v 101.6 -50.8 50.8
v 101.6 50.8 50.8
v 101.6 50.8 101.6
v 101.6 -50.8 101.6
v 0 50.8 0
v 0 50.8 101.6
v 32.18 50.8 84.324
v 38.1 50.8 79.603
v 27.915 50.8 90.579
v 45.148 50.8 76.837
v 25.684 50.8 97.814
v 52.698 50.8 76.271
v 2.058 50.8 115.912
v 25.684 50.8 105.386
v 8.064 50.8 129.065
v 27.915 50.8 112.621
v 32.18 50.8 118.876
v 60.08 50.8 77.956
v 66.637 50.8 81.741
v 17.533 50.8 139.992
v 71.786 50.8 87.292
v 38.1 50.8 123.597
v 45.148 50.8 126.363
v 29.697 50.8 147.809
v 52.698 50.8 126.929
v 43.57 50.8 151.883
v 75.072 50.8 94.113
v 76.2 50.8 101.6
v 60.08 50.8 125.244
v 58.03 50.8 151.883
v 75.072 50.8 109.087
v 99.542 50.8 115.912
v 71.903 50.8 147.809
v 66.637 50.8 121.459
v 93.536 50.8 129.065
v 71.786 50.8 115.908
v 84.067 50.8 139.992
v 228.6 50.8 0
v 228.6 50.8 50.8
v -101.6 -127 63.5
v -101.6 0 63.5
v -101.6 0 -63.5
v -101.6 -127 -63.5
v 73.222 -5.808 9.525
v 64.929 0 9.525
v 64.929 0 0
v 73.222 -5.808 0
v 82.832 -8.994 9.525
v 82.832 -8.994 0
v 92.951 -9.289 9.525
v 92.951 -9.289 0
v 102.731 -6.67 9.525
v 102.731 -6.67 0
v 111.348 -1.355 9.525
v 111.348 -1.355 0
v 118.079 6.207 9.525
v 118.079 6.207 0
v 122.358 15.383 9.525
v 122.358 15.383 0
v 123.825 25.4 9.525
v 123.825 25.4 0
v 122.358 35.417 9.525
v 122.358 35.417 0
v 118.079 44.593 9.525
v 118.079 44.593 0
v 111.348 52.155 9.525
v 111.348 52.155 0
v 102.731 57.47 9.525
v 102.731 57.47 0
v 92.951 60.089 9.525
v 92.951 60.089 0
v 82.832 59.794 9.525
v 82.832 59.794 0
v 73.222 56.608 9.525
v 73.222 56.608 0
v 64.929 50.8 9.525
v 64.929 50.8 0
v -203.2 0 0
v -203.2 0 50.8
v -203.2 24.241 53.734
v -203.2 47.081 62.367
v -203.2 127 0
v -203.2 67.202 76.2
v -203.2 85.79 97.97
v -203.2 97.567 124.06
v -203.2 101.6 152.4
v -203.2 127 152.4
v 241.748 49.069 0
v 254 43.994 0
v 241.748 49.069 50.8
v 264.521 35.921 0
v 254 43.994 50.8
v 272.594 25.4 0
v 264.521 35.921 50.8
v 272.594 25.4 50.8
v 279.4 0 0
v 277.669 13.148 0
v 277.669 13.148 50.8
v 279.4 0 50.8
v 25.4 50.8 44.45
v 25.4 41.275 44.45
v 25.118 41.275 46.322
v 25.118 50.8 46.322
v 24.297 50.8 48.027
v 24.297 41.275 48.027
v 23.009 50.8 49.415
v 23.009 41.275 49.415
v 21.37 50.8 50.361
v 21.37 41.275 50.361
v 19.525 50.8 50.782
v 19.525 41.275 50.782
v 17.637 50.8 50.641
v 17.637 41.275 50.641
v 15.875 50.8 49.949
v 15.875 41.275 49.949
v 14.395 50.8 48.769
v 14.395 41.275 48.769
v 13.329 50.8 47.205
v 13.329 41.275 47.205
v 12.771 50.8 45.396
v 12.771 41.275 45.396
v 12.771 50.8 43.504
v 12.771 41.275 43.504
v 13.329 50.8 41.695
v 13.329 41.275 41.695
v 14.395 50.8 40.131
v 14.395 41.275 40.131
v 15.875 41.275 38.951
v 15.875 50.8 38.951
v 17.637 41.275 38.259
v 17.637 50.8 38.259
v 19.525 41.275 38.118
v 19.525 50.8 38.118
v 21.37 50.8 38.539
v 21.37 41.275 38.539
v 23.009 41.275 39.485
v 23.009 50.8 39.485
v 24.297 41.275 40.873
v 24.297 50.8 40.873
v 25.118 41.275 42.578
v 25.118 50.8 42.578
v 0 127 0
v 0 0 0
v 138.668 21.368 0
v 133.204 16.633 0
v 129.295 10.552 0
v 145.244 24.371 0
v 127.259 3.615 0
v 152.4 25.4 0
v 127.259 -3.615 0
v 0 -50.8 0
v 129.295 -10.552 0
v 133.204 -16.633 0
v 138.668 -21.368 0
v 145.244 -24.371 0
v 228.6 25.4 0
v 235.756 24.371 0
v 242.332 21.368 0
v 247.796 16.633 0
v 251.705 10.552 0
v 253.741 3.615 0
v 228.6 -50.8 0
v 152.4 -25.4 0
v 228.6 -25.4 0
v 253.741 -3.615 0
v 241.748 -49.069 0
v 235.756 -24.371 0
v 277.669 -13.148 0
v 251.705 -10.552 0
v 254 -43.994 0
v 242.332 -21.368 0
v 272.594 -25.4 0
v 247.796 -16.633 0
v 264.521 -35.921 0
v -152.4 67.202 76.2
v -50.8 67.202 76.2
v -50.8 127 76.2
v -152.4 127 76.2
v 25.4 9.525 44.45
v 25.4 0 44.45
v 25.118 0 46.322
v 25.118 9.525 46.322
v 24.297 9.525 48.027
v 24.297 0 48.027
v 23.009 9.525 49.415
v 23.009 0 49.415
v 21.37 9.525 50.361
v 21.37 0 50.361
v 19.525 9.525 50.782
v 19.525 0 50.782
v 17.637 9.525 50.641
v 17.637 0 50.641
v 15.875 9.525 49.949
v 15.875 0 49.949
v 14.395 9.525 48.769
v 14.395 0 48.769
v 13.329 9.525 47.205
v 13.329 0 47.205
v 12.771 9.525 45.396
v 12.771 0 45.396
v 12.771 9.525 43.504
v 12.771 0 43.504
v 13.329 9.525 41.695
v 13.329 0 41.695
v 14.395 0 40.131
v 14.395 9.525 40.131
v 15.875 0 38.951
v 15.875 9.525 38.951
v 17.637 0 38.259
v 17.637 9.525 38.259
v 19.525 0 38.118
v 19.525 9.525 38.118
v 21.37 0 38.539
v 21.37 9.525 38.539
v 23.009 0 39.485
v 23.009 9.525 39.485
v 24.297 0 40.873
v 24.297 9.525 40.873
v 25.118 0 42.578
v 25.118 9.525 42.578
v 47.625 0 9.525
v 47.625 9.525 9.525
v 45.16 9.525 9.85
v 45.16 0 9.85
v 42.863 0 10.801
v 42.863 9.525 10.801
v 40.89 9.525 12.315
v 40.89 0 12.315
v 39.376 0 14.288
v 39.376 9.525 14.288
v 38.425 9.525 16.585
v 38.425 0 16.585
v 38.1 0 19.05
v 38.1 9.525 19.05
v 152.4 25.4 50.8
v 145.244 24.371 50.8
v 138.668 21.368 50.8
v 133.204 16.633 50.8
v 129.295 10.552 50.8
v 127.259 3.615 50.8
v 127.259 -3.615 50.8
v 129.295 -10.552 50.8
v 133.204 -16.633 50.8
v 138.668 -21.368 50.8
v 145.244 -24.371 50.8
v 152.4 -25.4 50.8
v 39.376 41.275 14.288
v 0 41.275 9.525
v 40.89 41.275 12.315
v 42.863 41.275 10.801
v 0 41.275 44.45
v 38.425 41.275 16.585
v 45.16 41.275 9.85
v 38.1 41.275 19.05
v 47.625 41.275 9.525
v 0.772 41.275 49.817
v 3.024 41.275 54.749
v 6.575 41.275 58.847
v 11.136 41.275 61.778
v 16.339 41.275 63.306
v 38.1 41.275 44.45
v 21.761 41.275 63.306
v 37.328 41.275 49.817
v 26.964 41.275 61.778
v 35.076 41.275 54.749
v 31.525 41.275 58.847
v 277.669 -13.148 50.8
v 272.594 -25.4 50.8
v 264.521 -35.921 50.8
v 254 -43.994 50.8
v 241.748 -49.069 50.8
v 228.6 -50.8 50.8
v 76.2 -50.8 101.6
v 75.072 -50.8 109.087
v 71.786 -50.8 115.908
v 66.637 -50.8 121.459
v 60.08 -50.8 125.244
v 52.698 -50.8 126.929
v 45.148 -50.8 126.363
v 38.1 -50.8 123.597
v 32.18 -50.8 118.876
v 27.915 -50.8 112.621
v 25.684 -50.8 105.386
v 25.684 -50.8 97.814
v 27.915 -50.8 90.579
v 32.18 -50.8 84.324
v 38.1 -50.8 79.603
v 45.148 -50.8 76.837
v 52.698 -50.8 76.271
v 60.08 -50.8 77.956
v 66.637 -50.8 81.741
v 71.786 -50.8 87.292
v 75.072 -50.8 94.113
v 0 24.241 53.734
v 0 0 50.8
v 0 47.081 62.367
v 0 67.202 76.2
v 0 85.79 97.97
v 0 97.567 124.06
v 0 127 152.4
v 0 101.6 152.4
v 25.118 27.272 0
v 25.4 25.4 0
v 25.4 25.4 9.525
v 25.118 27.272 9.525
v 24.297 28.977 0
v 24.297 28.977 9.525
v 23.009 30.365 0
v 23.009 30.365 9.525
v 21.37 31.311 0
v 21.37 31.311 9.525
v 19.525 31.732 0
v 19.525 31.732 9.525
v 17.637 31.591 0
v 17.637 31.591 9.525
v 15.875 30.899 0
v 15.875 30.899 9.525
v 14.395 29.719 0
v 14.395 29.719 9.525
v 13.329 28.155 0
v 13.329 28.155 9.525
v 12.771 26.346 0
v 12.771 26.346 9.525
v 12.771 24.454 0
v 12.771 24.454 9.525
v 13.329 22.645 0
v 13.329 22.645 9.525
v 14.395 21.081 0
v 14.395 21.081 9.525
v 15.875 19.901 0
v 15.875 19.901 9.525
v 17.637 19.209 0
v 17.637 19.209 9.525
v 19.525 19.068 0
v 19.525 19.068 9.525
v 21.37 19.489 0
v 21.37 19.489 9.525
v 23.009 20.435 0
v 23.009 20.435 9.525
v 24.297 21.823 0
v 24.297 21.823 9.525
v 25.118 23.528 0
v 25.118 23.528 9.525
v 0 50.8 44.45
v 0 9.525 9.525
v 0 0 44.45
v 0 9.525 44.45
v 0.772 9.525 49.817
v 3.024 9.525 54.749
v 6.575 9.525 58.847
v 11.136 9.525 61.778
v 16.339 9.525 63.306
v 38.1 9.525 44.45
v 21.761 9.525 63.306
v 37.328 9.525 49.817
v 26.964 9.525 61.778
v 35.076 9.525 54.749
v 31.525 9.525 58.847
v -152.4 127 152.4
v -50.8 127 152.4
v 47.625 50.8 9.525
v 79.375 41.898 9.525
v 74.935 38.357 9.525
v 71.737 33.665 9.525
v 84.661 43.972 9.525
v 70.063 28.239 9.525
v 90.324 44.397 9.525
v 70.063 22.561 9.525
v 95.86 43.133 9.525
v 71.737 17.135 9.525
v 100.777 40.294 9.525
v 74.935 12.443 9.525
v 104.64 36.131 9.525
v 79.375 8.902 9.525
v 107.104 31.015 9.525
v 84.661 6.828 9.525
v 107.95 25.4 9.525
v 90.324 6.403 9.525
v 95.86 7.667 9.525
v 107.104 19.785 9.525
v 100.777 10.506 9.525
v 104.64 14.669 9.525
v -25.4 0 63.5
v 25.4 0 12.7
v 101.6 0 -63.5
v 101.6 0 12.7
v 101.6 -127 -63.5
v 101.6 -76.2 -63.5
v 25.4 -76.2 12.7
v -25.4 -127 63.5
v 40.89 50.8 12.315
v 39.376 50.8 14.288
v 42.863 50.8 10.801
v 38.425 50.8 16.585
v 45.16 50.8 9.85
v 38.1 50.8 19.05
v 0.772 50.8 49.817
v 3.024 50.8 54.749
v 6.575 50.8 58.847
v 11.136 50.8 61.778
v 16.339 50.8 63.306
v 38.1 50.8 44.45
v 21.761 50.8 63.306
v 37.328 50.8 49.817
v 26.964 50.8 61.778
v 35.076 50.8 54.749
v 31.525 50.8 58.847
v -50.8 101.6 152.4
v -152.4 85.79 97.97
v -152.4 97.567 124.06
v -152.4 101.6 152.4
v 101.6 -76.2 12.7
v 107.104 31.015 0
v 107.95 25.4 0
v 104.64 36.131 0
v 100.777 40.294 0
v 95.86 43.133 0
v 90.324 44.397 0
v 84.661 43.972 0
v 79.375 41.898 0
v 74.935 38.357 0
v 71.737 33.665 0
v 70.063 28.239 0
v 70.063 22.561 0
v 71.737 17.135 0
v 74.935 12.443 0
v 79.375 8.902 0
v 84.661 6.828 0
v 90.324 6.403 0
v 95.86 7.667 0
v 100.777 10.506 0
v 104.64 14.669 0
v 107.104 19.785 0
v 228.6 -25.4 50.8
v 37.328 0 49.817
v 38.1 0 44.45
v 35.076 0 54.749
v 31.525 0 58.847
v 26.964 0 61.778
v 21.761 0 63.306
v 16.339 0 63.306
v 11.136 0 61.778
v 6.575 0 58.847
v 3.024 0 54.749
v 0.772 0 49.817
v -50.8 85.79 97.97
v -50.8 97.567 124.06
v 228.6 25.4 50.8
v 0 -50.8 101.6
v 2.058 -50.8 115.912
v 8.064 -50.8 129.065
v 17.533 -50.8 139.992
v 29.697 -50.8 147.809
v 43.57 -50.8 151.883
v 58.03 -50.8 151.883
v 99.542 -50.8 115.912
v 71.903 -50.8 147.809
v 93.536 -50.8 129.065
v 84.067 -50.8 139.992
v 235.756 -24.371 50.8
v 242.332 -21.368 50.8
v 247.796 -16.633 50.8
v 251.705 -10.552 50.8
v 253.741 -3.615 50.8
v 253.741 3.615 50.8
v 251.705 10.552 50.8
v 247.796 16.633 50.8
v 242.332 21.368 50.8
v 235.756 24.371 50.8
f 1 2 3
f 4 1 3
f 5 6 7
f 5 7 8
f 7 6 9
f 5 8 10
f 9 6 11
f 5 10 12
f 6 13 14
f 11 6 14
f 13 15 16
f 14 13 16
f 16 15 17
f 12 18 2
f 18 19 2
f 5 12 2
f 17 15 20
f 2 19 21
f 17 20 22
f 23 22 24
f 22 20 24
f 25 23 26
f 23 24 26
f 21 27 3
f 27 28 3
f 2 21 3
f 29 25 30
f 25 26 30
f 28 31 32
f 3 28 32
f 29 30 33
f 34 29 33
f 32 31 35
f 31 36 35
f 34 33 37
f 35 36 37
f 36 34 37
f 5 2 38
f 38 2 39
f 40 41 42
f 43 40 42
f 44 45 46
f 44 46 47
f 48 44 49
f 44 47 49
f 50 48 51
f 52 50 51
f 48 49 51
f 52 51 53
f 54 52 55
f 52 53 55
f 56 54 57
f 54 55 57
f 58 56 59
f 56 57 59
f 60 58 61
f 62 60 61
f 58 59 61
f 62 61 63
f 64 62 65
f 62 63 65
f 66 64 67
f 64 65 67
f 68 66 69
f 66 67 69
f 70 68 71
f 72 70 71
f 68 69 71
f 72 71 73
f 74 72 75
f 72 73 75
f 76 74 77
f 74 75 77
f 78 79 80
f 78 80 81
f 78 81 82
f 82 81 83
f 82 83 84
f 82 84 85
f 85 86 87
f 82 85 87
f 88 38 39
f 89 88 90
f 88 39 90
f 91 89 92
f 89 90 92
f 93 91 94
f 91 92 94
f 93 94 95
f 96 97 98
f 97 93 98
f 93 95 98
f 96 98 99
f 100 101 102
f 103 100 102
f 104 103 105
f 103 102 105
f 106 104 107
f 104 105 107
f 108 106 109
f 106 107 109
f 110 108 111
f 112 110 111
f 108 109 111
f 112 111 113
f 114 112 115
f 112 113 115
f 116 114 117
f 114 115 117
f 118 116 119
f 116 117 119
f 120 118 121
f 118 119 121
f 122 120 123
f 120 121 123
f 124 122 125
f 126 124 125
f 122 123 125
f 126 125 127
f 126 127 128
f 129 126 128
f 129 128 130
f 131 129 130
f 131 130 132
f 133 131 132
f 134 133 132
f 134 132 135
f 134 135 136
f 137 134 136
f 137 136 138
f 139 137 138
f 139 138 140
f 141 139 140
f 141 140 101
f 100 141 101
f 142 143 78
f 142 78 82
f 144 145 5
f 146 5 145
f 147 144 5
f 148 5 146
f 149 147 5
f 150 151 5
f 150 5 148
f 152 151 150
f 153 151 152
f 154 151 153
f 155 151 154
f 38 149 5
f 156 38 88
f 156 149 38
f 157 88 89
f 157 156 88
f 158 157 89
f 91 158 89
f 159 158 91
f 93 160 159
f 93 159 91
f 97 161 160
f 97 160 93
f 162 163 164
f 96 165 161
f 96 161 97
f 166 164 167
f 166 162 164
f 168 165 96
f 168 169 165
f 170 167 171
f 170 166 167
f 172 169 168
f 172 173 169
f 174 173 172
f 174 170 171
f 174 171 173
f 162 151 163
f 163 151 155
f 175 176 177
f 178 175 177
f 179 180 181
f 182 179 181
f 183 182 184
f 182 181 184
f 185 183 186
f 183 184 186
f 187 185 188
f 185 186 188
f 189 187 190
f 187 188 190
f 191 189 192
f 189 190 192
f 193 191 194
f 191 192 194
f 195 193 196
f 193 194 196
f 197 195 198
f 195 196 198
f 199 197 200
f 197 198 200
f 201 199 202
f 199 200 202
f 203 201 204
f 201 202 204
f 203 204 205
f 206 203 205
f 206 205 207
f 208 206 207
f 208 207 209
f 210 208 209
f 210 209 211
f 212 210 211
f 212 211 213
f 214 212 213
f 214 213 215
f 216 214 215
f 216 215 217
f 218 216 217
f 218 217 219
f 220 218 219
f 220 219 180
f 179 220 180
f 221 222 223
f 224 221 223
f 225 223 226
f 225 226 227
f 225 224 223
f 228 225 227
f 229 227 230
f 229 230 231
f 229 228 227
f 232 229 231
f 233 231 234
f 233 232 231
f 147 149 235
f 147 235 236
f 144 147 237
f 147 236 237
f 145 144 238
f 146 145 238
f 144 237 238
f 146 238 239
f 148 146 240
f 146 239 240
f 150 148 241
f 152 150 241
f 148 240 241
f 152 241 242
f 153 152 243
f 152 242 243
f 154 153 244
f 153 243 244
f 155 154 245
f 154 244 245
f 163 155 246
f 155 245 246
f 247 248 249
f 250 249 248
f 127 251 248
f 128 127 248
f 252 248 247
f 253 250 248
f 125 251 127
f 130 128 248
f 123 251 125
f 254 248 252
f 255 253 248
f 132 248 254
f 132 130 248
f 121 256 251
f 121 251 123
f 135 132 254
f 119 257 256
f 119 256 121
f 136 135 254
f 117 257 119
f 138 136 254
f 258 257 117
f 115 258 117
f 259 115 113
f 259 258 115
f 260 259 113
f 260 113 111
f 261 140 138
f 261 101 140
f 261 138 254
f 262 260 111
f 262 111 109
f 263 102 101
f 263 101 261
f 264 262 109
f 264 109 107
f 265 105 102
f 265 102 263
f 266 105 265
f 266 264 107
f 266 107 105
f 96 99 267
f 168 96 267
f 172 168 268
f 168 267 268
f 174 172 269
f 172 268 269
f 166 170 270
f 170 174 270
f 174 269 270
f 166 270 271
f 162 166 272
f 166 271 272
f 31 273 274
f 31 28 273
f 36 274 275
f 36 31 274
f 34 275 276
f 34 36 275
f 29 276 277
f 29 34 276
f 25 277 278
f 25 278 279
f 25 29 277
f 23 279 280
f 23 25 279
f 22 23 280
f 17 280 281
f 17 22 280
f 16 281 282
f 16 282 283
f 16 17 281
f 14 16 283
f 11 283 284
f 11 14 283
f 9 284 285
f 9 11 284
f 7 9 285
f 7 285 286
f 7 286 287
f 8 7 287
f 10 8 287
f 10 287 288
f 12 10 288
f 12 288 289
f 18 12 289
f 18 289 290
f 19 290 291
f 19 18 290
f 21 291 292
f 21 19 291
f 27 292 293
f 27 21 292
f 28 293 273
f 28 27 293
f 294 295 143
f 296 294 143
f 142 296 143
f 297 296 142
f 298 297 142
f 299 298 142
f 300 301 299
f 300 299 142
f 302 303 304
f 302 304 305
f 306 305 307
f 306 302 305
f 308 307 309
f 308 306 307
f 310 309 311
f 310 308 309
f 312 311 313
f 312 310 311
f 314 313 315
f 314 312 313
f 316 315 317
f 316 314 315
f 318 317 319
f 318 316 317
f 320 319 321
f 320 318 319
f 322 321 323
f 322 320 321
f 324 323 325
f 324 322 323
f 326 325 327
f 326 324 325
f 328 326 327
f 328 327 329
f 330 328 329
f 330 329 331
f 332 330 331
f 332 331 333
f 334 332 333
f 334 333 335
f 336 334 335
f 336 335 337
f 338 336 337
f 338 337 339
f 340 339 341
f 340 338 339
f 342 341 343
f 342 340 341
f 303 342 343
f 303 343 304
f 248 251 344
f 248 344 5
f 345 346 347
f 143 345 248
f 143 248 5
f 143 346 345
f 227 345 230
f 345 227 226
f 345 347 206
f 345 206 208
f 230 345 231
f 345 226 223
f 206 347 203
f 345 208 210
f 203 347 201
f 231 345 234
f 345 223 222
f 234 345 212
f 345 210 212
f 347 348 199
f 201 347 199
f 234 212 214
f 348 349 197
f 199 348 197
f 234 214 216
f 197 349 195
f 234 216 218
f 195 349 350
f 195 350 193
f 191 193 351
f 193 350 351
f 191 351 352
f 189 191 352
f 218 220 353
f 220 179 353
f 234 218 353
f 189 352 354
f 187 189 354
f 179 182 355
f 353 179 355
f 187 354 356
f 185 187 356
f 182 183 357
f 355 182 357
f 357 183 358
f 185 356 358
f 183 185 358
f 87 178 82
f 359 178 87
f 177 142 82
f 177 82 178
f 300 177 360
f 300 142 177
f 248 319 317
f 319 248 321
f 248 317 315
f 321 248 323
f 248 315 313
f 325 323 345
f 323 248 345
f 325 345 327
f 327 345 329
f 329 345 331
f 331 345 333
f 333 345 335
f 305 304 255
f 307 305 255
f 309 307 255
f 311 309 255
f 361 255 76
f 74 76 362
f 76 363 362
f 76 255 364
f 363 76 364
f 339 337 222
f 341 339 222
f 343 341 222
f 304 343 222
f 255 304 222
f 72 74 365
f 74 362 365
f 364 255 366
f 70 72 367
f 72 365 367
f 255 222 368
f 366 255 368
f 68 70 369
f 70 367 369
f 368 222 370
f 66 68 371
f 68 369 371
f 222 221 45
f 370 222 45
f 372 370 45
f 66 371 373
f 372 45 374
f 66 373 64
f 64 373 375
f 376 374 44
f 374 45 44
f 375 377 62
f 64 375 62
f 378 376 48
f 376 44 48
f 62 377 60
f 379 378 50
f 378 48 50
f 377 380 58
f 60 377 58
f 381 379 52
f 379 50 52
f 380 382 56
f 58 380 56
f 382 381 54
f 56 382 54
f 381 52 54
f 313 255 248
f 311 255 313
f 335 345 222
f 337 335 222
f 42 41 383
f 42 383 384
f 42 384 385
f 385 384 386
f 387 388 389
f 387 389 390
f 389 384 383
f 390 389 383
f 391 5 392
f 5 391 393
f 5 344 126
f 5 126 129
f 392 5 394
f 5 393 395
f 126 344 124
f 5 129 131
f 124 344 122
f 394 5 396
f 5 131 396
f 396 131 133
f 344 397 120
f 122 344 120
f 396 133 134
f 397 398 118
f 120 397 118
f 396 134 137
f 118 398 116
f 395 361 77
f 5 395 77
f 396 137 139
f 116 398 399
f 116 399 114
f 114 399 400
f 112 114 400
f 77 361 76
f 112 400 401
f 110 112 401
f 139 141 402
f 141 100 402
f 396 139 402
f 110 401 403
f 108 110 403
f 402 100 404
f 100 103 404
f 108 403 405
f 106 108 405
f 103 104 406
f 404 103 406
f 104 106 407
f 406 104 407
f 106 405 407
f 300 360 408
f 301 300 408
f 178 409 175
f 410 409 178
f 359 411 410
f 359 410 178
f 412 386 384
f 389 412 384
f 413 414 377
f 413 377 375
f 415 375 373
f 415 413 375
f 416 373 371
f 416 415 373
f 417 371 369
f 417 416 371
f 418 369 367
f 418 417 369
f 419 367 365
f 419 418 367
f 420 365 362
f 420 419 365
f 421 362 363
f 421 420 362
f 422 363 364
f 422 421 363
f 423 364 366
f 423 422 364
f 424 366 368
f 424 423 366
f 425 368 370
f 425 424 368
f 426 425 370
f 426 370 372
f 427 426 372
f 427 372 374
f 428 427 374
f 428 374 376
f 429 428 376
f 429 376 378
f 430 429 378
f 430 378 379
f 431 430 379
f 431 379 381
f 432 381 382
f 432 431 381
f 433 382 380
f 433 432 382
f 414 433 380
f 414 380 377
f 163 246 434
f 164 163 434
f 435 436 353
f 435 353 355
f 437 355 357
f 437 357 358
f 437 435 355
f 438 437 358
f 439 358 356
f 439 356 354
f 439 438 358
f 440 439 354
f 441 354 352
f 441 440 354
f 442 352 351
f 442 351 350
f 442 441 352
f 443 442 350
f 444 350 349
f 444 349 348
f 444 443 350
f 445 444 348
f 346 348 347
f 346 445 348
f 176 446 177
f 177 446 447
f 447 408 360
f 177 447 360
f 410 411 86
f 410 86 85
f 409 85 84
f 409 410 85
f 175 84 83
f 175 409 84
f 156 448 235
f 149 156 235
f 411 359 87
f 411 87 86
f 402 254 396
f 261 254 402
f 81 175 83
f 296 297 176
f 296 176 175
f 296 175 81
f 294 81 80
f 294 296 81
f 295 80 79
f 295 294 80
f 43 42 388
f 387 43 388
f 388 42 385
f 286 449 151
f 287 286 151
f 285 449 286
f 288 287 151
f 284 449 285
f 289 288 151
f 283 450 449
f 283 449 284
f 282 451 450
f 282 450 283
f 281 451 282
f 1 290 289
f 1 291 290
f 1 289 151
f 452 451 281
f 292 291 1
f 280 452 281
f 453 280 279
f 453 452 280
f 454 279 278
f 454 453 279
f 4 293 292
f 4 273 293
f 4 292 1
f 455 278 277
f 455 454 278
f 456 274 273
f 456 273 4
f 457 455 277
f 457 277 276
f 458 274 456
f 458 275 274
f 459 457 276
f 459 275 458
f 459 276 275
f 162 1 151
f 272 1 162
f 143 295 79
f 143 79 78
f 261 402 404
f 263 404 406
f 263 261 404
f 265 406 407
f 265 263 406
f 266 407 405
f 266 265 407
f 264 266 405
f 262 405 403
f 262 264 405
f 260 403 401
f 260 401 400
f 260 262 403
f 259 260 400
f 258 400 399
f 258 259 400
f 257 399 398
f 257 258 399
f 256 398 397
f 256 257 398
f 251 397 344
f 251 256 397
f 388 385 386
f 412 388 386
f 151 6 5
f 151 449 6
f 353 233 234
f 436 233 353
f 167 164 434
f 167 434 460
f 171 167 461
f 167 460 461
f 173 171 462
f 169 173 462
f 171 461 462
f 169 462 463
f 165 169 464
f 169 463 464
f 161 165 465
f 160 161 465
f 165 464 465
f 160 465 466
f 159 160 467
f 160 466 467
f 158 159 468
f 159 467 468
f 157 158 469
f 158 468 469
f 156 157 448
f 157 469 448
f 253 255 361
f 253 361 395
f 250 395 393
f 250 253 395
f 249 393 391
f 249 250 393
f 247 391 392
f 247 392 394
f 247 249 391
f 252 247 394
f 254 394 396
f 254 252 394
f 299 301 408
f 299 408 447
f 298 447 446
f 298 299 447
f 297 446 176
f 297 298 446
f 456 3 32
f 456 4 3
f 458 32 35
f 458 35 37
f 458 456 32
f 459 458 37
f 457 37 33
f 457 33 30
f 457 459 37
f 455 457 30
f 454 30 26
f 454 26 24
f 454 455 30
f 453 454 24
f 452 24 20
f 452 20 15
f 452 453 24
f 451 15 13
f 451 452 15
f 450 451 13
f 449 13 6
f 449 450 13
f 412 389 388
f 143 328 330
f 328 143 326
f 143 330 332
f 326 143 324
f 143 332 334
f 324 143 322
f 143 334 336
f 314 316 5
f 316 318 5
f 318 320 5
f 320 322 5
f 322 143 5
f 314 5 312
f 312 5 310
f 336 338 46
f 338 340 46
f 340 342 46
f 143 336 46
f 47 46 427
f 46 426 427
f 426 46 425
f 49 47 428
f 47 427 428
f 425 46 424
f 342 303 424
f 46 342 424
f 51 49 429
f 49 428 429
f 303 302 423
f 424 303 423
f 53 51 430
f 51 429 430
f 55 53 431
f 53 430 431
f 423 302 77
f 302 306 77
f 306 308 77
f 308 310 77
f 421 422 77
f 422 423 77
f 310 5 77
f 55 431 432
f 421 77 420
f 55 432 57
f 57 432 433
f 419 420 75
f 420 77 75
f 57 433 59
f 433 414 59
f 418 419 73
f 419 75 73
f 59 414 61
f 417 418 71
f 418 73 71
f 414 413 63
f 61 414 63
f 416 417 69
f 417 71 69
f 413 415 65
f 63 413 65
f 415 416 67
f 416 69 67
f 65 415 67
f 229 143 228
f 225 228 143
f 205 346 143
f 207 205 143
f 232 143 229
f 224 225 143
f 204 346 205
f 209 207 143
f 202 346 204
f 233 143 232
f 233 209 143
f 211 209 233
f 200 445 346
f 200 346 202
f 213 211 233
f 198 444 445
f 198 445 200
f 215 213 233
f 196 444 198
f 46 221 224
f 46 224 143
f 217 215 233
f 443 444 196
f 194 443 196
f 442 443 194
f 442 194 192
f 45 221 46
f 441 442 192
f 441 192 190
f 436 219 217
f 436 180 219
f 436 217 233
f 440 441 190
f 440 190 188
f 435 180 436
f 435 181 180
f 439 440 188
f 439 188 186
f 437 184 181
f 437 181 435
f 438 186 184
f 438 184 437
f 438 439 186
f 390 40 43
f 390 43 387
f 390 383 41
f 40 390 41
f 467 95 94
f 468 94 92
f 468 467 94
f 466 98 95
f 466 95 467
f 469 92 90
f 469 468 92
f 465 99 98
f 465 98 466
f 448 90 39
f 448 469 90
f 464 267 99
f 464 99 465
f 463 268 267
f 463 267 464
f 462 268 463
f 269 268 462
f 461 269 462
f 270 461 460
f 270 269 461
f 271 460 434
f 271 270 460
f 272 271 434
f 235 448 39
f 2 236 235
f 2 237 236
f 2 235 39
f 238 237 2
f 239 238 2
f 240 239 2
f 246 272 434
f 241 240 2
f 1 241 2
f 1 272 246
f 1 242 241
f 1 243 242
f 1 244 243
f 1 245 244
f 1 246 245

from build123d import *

# Parameters (mm, degrees)
F1_DEPTH  = 127
F2_DEPTH  = 76.2
F4_DEPTH  = 203.2
F5_START  = -50.8
F5_DEPTH  = 101.6
F6_R      = 25.4
F7_DEPTH  = 50.8
F9_DEPTH  = 110.49
F10_R     = 6.35
F10_R_2   = 19.05
F11_DEPTH = 9.525
F12_R     = 6.35
F13_DEPTH = 50.8
F14_START = -9.525
F14_DEPTH = 31.75


with BuildPart() as f1:
    # F0 (on Front) → F1 (new body)
    with BuildSketch(Plane.XZ):
        Polygon((-25.4, 63.5), (-101.6, 63.5), (-101.6, -63.5), (25.4, -63.5), (101.6, -63.5), (25.4, 12.7), align=None)
    extrude(amount=F1_DEPTH)

    # F0 (on Front) → F2 (join)
    with BuildSketch(Plane.XZ):
        Polygon((101.6, 12.7), (25.4, 12.7), (101.6, -63.5), align=None)
    extrude(amount=F2_DEPTH)


with BuildPart() as f4:
    # F3 (on Right) → F4 (new body)
    with BuildSketch(Plane.YZ):
        with BuildLine():
            Line((0, 50.8), (0, 0))
            Line((0, 0), (127, 0))
            Line((127, 0), (127, 76.2))
            Line((127, 76.2), (67.202083301, 76.2))
            ThreePointArc((67.202083301, 76.2), (35.9210244843, 57.3619023759), (0, 50.8))
        make_face()
        with BuildLine():
            Line((67.202083301, 76.2), (127, 76.2))
            Line((127, 76.2), (127, 152.4))
            Line((127, 152.4), (101.6, 152.4))
            ThreePointArc((101.6, 152.4), (92.602083301, 110.597916699), (67.202083301, 76.2))
        make_face()
    extrude(amount=-F4_DEPTH)

    # F3 (on Right) → F5 (cut)
    with BuildSketch(Plane.YZ.offset(F5_START)):
        with BuildLine():
            Line((67.202083301, 76.2), (127, 76.2))
            Line((127, 76.2), (127, 152.4))
            Line((127, 152.4), (101.6, 152.4))
            ThreePointArc((101.6, 152.4), (92.602083301, 110.597916699), (67.202083301, 76.2))
        make_face()
    extrude(amount=-F5_DEPTH, mode=Mode.SUBTRACT)


with BuildPart() as f7:
    # F6 (on Front) → F7 (new body, symmetric)
    with BuildSketch(Plane.XZ):
        with BuildLine():
            Line((0, 101.6), (0, 0))
            Line((0, 0), (279.4, 0))
            Line((279.4, 0), (279.4, 50.8))
            Line((279.4, 50.8), (101.6, 50.8))
            Line((101.6, 50.8), (101.6, 101.6))
            ThreePointArc((101.6, 101.6), (50.8, 152.4), (0, 101.6))
        make_face()
        with Locations((50.8, 101.6)):
            Circle(F6_R, mode=Mode.SUBTRACT)
    extrude(amount=F7_DEPTH, both=True)

    # F8 (on face) → F9 (cut)
    with BuildSketch(Plane.XY.offset(50.8)):
        with BuildLine():
            ThreePointArc((152.4, 25.4), (127, 0), (152.4, -25.4))
            Line((152.4, -25.4), (184.6059094878, -25.4))
            Line((184.6059094878, -25.4), (228.6, -25.4))
            ThreePointArc((228.6, -25.4), (254, 0), (228.6, 25.4))
            Line((228.6, 25.4), (184.6059094878, 25.4))
            Line((184.6059094878, 25.4), (152.4, 25.4))
        make_face()
        with BuildLine():
            Line((279.4, 50.8), (228.600000246, 50.8))
            ThreePointArc((228.600000246, 50.8), (264.5210247595, 35.921024209), (279.4, -5.325e-07))
            Line((279.4, -5.325e-07), (279.4, 50.8))
        make_face()
        with BuildLine():
            ThreePointArc((279.4, -5.325e-07), (264.5210243091, -35.9210246594), (228.6000000372, -50.8))
            Line((228.6000000372, -50.8), (279.4, -50.8))
            Line((279.4, -50.8), (279.4, -5.325e-07))
        make_face()
    extrude(amount=-F9_DEPTH, mode=Mode.SUBTRACT)


with BuildPart() as f11:
    # F10 (on Top) → F11 (new body)
    with BuildSketch(Plane.XY):
        with BuildLine():
            Line((0, 50.8), (0, 0))
            Line((0, 0), (64.929275668, 0))
            ThreePointArc((64.929275668, 0), (123.825, 25.4), (64.929275668, 50.8))
            Line((64.929275668, 50.8), (0, 50.8))
        make_face()
        with Locations((19.05, 25.4)):
            Circle(F10_R, mode=Mode.SUBTRACT)
        with Locations((88.9, 25.4)):
            Circle(F10_R_2, mode=Mode.SUBTRACT)
    extrude(amount=F11_DEPTH)

    # F12 (on Front) → F13 (join)
    with BuildSketch(Plane.XZ):
        with BuildLine():
            Line((0, 44.45), (0, 9.525))
            Line((0, 9.525), (47.625, 9.525))
            ThreePointArc((47.625, 9.525), (40.8898079092, 12.3148079092), (38.1, 19.05))
            Line((38.1, 19.05), (38.1, 44.45))
            ThreePointArc((38.1, 44.45), (19.05, 63.5), (0, 44.45))
        make_face()
        with Locations((19.05, 44.45)):
            Circle(F12_R, mode=Mode.SUBTRACT)
    extrude(amount=-F13_DEPTH)

    # F12 (on Front) → F14 (cut)
    with BuildSketch(Plane.XZ.offset(F14_START)):
        with BuildLine():
            Line((0, 44.45), (0, 9.525))
            Line((0, 9.525), (47.625, 9.525))
            ThreePointArc((47.625, 9.525), (40.8898079092, 12.3148079092), (38.1, 19.05))
            Line((38.1, 19.05), (38.1, 44.45))
            ThreePointArc((38.1, 44.45), (19.05, 63.5), (0, 44.45))
        make_face()
        with Locations((19.05, 44.45)):
            Circle(F12_R, mode=Mode.SUBTRACT)
    extrude(amount=-F14_DEPTH, mode=Mode.SUBTRACT)


solid = Compound([f1.part, f4.part, f7.part, f11.part])
